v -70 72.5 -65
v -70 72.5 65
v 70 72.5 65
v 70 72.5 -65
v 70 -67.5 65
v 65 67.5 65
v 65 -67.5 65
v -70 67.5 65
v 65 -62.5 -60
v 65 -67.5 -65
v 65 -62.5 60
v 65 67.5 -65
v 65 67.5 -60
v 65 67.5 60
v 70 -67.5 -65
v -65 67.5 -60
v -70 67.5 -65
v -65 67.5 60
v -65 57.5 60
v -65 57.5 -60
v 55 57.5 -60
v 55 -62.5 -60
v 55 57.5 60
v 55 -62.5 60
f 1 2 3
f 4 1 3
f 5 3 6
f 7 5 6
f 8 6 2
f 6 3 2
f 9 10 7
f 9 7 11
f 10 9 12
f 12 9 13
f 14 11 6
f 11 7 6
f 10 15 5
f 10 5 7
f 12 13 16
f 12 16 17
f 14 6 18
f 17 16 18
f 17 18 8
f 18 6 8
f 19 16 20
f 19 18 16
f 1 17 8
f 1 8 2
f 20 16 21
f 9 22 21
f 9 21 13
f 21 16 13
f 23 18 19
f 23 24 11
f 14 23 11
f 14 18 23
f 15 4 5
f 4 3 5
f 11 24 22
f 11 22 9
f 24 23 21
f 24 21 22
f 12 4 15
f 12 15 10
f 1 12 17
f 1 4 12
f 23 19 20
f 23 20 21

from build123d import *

# Parameters (mm, degrees)
SALIENTE_EXTRUIR1_DEPTH = 65
SALIENTE_EXTRUIR2_DEPTH = 60


with BuildPart() as part:
    # Croquis1 → Saliente-Extruir1 (new, symmetric)
    with BuildSketch(Plane.XY):
        Polygon((-70, 72.5), (70, 72.5), (70, -67.5), (65, -67.5), (65, 67.5), (-70, 67.5), align=None)
    extrude(amount=SALIENTE_EXTRUIR1_DEPTH, both=True)

    # Croquis2 → Saliente-Extruir2 (add, symmetric)
    with BuildSketch(Plane.XY):
        Polygon((-65, 67.5), (-65, 57.5), (55, 57.5), (55, -62.5), (65, -62.5), (65, 67.5), align=None)
    extrude(amount=SALIENTE_EXTRUIR2_DEPTH, both=True)


solid = part.part
